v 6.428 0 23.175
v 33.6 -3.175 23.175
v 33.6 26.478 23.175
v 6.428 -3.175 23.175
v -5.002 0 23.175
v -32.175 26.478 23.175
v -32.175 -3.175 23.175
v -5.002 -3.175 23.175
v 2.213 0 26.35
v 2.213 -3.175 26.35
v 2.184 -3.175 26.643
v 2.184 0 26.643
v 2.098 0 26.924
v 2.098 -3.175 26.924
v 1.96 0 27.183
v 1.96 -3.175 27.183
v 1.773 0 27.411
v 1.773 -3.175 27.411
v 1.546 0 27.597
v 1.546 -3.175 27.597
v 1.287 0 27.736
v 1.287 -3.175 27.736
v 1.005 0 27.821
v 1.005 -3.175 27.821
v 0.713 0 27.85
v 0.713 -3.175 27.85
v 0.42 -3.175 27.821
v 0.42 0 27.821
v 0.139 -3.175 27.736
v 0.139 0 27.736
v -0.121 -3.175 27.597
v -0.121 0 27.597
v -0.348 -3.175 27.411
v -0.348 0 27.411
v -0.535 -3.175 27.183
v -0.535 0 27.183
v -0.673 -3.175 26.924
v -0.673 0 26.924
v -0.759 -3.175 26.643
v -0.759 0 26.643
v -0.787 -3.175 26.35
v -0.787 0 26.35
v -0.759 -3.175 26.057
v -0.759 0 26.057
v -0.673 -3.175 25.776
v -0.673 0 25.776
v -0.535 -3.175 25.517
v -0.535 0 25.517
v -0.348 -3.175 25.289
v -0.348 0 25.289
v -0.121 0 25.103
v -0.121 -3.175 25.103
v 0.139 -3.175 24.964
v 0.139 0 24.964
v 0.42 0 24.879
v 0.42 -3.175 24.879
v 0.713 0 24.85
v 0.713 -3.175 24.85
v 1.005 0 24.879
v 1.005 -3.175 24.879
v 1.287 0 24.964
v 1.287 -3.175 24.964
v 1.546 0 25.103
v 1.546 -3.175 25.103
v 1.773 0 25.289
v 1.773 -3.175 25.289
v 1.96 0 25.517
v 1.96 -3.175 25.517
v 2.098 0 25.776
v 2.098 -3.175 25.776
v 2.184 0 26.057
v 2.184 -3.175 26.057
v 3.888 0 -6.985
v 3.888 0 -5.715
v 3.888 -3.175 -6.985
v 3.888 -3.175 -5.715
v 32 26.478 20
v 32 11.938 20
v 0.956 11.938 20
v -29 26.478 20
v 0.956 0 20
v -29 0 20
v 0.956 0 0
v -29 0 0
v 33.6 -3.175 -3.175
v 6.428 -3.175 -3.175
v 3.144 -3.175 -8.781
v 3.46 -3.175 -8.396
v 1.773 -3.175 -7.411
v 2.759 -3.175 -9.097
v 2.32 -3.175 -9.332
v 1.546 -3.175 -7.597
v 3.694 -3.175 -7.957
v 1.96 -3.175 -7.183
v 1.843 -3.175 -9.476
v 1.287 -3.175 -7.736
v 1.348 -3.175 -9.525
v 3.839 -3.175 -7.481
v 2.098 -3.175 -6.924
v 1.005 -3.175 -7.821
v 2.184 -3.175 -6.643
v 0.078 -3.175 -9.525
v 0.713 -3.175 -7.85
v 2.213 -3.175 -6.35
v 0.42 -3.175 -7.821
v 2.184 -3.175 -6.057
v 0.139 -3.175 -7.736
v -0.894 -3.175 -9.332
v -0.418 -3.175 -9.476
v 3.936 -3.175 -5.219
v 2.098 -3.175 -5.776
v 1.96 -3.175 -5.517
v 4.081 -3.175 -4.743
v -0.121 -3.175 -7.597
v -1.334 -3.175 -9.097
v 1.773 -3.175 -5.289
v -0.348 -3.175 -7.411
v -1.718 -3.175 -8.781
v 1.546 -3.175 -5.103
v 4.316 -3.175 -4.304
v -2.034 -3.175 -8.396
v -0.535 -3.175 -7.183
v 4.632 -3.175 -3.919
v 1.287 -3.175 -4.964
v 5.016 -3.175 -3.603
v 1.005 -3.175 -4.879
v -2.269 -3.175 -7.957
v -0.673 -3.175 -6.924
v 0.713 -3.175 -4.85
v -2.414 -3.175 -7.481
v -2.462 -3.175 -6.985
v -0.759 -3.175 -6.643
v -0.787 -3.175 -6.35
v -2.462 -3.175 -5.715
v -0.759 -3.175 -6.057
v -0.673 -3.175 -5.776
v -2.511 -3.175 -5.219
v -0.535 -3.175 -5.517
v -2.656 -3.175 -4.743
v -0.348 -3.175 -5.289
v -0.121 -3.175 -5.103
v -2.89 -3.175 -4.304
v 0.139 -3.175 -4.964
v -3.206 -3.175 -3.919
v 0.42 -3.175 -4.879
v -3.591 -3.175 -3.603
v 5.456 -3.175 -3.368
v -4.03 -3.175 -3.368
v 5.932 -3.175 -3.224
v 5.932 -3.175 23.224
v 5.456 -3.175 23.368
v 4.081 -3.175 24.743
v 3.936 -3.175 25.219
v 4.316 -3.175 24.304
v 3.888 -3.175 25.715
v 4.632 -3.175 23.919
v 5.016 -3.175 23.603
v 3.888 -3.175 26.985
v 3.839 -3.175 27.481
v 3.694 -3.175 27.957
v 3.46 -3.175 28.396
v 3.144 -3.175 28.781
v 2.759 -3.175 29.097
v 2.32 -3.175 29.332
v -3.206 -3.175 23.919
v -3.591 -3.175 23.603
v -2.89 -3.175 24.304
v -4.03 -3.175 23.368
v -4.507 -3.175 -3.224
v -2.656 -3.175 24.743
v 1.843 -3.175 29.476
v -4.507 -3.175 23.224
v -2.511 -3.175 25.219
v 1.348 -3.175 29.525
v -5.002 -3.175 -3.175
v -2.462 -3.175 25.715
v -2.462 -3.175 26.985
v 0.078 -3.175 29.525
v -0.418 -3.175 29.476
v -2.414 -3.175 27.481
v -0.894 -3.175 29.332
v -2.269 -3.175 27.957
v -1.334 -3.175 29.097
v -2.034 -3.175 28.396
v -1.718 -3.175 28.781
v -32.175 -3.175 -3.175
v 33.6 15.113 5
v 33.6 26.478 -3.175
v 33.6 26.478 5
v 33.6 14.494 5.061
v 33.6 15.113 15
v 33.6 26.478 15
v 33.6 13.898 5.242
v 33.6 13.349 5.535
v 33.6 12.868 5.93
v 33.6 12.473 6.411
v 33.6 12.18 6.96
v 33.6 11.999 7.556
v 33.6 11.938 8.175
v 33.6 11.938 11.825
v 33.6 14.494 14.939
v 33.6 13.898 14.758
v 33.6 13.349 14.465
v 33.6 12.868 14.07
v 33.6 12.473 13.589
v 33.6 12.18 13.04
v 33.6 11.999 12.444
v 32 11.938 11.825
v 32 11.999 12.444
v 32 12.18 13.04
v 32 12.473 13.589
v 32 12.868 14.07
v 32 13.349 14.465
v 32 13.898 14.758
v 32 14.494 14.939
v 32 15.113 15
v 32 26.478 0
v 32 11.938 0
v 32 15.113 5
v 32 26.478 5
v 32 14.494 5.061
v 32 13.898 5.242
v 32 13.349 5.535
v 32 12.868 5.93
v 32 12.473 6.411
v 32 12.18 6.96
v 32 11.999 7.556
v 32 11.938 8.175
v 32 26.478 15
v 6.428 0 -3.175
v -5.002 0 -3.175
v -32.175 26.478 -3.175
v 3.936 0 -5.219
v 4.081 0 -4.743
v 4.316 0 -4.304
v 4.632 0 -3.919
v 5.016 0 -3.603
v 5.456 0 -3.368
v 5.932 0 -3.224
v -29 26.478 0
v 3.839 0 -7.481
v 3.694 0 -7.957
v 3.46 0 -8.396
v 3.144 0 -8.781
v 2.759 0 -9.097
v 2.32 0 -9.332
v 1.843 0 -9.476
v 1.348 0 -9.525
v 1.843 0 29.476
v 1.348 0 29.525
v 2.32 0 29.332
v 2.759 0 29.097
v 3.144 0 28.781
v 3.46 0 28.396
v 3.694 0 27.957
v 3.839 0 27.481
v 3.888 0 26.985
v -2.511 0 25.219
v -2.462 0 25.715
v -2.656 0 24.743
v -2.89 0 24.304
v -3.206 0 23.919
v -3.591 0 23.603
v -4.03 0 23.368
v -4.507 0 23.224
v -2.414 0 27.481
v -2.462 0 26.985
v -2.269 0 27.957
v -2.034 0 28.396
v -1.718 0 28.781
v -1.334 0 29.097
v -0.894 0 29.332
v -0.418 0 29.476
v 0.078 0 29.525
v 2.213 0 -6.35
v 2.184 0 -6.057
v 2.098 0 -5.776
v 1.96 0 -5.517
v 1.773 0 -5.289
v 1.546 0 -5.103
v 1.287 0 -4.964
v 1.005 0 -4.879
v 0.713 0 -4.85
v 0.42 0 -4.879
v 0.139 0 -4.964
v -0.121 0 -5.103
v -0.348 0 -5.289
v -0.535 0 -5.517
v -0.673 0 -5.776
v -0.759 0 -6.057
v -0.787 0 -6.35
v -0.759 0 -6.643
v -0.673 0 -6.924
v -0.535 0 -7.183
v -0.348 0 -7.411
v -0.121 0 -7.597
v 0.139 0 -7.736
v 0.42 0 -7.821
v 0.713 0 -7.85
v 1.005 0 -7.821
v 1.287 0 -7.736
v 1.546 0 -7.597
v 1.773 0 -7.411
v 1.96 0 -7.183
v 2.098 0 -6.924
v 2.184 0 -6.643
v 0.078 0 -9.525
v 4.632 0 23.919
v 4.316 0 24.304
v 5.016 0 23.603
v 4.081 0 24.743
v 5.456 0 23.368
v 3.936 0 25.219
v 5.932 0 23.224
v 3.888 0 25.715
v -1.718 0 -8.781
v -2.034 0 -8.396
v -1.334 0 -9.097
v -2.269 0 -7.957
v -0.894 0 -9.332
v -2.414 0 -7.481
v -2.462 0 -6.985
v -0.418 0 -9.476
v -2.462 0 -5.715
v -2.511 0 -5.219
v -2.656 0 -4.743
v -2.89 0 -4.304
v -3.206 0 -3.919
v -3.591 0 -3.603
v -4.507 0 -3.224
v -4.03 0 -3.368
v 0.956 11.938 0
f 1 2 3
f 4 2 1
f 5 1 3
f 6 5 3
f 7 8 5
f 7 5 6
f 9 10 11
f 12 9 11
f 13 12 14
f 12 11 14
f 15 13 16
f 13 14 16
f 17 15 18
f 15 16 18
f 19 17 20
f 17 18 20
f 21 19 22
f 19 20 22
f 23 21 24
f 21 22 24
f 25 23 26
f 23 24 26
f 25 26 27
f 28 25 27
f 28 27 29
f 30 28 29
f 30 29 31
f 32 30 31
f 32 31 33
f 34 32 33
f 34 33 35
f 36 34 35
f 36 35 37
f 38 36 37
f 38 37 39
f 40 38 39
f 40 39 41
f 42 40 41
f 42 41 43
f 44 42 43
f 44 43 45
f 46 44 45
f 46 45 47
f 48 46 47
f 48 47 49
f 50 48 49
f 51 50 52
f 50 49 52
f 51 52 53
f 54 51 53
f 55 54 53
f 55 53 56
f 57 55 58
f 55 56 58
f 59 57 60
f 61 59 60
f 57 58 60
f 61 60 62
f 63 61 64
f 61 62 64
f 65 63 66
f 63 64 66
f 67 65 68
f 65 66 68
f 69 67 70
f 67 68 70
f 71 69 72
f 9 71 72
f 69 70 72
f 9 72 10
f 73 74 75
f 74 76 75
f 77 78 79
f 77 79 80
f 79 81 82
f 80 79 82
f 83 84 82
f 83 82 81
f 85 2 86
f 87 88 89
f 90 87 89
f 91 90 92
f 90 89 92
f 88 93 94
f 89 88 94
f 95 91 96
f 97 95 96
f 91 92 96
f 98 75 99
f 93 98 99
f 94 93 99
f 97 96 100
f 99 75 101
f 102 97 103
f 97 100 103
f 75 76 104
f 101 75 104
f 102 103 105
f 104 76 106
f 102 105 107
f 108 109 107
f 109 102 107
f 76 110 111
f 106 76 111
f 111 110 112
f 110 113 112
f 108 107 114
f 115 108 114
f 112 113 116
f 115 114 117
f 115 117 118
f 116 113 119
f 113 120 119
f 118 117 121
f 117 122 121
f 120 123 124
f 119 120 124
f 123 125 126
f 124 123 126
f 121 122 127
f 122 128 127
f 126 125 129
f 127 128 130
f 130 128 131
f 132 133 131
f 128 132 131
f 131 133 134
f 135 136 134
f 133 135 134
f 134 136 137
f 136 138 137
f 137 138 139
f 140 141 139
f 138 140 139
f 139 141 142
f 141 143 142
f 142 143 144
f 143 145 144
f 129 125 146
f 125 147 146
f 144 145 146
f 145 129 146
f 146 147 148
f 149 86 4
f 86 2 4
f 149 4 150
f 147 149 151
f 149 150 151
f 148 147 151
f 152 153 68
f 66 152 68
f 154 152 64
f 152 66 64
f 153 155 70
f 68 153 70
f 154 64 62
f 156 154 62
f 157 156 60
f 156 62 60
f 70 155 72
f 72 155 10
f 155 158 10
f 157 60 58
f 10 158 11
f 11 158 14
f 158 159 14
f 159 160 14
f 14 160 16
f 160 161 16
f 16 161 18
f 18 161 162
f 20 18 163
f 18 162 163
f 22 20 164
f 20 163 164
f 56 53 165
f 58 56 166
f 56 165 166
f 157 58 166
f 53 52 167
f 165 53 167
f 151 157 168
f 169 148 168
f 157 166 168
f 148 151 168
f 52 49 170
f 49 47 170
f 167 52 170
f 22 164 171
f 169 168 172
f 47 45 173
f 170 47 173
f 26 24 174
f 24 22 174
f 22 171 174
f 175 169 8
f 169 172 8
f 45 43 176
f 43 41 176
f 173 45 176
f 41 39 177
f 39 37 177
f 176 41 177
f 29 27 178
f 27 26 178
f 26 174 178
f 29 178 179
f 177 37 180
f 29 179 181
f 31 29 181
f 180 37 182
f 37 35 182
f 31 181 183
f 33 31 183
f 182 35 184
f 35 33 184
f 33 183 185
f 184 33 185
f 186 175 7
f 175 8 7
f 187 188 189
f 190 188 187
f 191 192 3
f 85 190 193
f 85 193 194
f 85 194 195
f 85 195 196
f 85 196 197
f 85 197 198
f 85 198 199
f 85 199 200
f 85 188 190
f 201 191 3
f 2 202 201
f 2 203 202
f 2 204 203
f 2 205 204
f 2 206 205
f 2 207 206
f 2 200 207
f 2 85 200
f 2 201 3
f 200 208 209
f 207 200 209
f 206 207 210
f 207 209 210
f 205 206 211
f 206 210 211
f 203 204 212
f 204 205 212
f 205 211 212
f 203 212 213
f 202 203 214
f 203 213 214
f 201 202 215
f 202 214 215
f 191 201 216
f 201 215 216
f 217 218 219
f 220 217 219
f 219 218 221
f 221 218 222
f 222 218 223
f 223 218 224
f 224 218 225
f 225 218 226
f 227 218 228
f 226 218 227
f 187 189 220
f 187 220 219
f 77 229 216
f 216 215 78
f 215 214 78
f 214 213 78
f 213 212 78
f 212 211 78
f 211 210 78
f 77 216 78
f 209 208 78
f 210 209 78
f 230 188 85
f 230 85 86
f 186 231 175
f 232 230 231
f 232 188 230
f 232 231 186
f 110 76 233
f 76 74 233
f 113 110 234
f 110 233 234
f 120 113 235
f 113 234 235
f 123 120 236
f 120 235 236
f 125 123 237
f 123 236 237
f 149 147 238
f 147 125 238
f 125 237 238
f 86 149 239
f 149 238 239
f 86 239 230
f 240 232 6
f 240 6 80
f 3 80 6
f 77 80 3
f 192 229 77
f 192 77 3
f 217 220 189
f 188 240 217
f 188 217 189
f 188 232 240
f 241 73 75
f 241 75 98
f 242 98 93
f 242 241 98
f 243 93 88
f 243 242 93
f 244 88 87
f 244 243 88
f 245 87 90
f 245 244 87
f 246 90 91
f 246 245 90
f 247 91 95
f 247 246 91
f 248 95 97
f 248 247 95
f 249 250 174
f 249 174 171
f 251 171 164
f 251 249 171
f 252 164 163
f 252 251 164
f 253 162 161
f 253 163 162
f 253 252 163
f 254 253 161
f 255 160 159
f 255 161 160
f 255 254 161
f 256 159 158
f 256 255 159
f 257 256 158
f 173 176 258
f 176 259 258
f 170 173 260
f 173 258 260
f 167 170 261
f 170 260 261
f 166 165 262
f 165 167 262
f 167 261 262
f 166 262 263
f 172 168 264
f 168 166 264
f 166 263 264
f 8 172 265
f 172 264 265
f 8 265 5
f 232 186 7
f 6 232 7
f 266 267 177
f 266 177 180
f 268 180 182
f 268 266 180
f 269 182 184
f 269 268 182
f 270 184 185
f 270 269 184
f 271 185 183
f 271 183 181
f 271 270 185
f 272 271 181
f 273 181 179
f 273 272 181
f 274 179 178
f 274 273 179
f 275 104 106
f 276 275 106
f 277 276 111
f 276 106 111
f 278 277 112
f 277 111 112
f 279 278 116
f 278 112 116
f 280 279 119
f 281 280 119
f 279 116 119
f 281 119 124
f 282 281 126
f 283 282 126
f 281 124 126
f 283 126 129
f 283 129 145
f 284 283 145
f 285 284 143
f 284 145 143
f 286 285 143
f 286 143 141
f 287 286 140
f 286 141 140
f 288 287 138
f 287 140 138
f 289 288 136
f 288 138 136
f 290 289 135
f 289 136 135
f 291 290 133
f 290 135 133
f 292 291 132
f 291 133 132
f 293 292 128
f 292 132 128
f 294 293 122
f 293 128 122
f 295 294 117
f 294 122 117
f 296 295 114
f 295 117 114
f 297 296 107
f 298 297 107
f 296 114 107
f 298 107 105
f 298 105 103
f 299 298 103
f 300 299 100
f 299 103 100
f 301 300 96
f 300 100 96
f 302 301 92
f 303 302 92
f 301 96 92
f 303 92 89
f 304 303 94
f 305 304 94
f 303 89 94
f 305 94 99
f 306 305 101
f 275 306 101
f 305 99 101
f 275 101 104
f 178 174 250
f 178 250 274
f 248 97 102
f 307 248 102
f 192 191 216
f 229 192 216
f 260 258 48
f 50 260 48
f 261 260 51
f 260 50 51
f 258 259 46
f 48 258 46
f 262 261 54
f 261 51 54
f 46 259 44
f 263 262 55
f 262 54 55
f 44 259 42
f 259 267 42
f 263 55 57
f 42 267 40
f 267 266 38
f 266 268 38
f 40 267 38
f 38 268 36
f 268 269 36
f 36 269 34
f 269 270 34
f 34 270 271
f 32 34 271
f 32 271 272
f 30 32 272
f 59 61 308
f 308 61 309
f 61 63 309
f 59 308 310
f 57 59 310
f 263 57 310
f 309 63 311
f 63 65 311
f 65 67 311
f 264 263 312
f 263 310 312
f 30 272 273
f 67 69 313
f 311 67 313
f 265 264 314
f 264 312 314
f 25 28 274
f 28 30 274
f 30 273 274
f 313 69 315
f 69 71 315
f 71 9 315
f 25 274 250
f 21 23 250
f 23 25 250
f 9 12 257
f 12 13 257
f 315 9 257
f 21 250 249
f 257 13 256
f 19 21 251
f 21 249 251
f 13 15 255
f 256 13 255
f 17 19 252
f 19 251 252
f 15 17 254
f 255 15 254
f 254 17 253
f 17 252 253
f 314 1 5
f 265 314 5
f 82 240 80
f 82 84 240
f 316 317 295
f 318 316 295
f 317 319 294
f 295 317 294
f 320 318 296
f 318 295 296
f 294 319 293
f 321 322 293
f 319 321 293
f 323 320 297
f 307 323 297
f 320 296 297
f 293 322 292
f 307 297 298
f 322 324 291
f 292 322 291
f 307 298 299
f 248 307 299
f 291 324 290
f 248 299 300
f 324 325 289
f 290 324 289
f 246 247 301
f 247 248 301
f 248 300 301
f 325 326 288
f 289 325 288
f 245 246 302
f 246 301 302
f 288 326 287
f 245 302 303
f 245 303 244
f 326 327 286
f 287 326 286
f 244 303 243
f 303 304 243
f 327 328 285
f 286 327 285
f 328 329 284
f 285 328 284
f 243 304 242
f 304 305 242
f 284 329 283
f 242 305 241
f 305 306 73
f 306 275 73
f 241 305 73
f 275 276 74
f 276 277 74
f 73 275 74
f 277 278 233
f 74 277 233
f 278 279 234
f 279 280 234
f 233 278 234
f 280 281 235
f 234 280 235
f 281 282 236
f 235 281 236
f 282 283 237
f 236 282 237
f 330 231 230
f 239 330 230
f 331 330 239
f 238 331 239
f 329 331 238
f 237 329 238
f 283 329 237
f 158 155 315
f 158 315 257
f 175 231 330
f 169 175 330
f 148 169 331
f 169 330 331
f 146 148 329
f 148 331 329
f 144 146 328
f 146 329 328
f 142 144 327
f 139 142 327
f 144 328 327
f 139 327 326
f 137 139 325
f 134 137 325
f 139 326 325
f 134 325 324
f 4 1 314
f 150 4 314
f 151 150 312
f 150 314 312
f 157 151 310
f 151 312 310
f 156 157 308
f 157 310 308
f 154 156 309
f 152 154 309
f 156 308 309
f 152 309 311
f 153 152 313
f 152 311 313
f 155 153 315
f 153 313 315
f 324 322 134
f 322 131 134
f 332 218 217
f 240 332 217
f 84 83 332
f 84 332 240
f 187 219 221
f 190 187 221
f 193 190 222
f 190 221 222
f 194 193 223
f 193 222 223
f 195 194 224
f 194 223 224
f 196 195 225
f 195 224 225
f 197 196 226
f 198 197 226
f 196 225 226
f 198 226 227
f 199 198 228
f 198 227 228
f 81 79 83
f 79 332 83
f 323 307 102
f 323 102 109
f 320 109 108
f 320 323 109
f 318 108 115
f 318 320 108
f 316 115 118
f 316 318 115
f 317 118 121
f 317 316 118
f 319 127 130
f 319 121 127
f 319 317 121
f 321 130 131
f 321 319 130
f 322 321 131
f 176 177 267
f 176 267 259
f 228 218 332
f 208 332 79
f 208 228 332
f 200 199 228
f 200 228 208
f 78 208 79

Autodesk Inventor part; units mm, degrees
ref_plane "YZ Plane" through (0, 0, 0) normal (1, 0, 0) x (0, 1, 0)
ref_plane "XZ Plane" through (0, 0, 0) normal (0, 1, 0) x (-1, 0, 0)
sketch "Sketch1" plane through (0, 0, 0) normal (0, 0, 1) x (1, 0, 0)
  line L0 (0, 0) -> (32, 0)
  line L1 (32, 0) -> (32, 11.938)
  line L2 (32, 11.938) -> (0, 11.938)
  line L3 (0, 11.938) -> (0, 0)
  line L4 (0, 0) -> (-29, 0)
  line L5 (-29, 0) -> (-29, 11.938)
  line L6 (-29, 11.938) -> (0, 11.938)
  line L7 (0, 11.938) -> (0, 0)
  line L8 (32, 11.938) -> (-9, 11.938)
  line L9 (-9, 11.938) -> (-9, 23.938)
  line L10 (-9, 23.938) -> (32, 23.938)
  line L11 (32, 23.938) -> (32, 11.938)
  line L12 (32, 0) -> (33.6002, 0)
  line L13 (33.6002, 0) -> (33.6002, 23.938)
  line L14 (33.6002, 23.938) -> (32, 23.938)
  line L15 (32, 23.938) -> (32, 0)
  line L16 (33.6002, 0) -> (-29, 0)
  line L17 (-29, 0) -> (-29, -3.175)
  line L18 (-29, -3.175) -> (33.6002, -3.175)
  line L19 (33.6002, -3.175) -> (33.6002, 0)
  line L20 (-29, -3.175) -> (-32.175, -3.175)
  line L21 (-32.175, -3.175) -> (-32.175, 23.938)
  line L22 (-32.175, 23.938) -> (-29, 23.938)
  line L23 (-29, 23.938) -> (-29, -3.175)
  line L24 (-32.175, 23.938) -> (33.6002, 23.938)
  line L25 (33.6002, 23.938) -> (33.6002, 27.113)
  line L26 (33.6002, 27.113) -> (-32.175, 27.113)
  line L27 (-32.175, 27.113) -> (-32.175, 23.938)
  line L28 (0, 11.938) -> (0.9559, 11.938)
  line L29 (0.9559, 11.938) -> (0.9559, 0)
  line L30 (0.9559, 0) -> (0, 0)
  line L31 (0, 0) -> (0, 11.938)
  point P0 (0.9559, 0)
  dimension "d0" = 32
  dimension "d1" = 11.938
  dimension "d2" = 29
  dimension "d3" = 41
  dimension "d4" = 12
  dimension "d5" = 1.6002
  dimension "d7" = 3.175
  dimension "d8" = 3.175
  dimension "d9" = 3.175
extrude "Extrusion1" add sketch "Sketch1" along normal blind 20 contours L0 L12 L19 L18 L17 L4 | L29 L2 L1 L0 | L17 L20 L21 L22 L23 L5 | L1 L11 L14 L13 L12
sketch "Sketch2" plane through (0, 0, 20) normal (0, 0, 1) x (1, 0, 0)
  line L0 (-29, 23.938) -> (-32.175, 23.938) projected
  line L1 (-32.175, -3.175) -> (33.6002, -3.175) projected
  line L2 (-32.175, 23.938) -> (33.6002, 23.938)
  line L3 (33.6002, 23.938) -> (33.6002, -3.175)
  line L4 (33.6002, -3.175) -> (-32.175, -3.175)
  line L5 (-32.175, -3.175) -> (-32.175, 23.938)
  point P0 (0, 0)
  point P1 (-32.175, -3.175)
ref_plane "Work Plane1" through (0, 0, 10) normal (0, 0, 1) x (1, 0, 0)
extrude "Extrusion2" add sketch "Sketch2" along normal blind 3.175
mirror "Mirror1" about plane through (0, 0, 10) normal (0, 0, 1) of "Extrusion2"
sketch "Sketch3" plane through (33.6002, -3.175, 23.175) normal (1, 0, 0) x (0, 0, -1)
  line L0 (23.175, 15.113) -> (3.175, 15.113) projected
  line L1 (23.175, 27.113) -> (3.175, 27.113) projected
  line L2 (13.175, 15.113) -> (8.175, 15.113)
  line L3 (8.175, 15.113) -> (8.175, 27.113)
  line L4 (8.175, 27.113) -> (13.175, 27.113)
  line L5 (13.175, 27.113) -> (13.175, 15.113)
  line L6 (13.175, 27.113) -> (18.175, 27.113)
  line L7 (18.175, 27.113) -> (18.175, 15.113)
  line L8 (18.175, 15.113) -> (13.175, 15.113)
  line L9 (13.175, 15.113) -> (13.175, 27.113)
  point P0 (23.175, 3.175)
  dimension "d15" = 5
  dimension "d16" = 5
extrude "Extrusion3" cut sketch "Sketch3" against normal blind 3.175
fillet "Fillet1" radius 3.175 2 edges at (32.8001, 11.938, 5) (32.8001, 11.938, 15)
sketch "Sketch4" plane through (-32.175, -3.175, 23.175) normal (0, -1, 0) x (1, 0, 0)
  line L0 (65.7752, -8.175) -> (65.7752, 0) projected
  line L1 (65.7752, -26.35) -> (0, -26.35) projected
  line L2 (65.7752, 0) -> (0, 0)
  line L3 (0, 0) -> (0, -26.35)
  line L4 (0, -26.35) -> (65.7752, -26.35)
  line L5 (65.7752, -26.35) -> (65.7752, 0)
  line L6 (32.8876, 0) -> (36.0626, 0)
  line L7 (36.0626, 0) -> (36.0626, 6.35)
  line L8 (36.0626, 6.35) -> (32.8876, 6.35)
  line L9 (32.8876, 6.35) -> (32.8876, 0)
  line L10 (32.8876, 6.35) -> (29.7126, 6.35)
  line L11 (29.7126, 6.35) -> (29.7126, 0)
  line L12 (29.7126, 0) -> (32.8876, 0)
  line L13 (32.8876, 0) -> (32.8876, 6.35)
  circle A0 centre (32.8876, 3.175) radius 1.5
  line L14 (65.7752, -13.175) -> (55.6443, -13.175)
  line L15 (36.0626, -26.35) -> (36.0626, -32.7)
  line L16 (36.0626, -32.7) -> (32.8876, -32.7)
  line L17 (32.8876, -32.7) -> (29.7126, -32.7)
  line L18 (29.7126, -32.7) -> (29.7126, -26.35)
  circle A1 centre (32.8876, -29.525) radius 1.5
  point P0 (32.175, -23.175)
  dimension "d20" = 3.175
  dimension "d21" = 6.35
  dimension "d22" = 3.175
  dimension "d23" = 3
extrude "Extrusion4" add sketch "Sketch4" against normal blind 3.175 contours L2 L9 A0 L8 L7 | L2 L11 L10 L9 A0 | L15 L16 L17 L18 L1
fillet "Fillet2" radius 2.54 8 edges at (-2.4624, -1.5875, 23.175) (-2.4624, -1.5875, 29.525) (3.8876, -1.5875, 29.525) (3.8876, -1.5875, 23.175) (-2.4624, -1.5875, -9.525) (3.8876, -1.5875, -9.525) (3.8876, -1.5875, -3.175) (-2.4624, -1.5875, -3.175)
sketch "Sketch5" plane through (-29, 23.938, 20) normal (0, 1, 0) x (1, 0, 0)
  line L0 (62.6002, 5) -> (61, 5) projected
  line L1 (61, 5) -> (61, 0) projected
  line L2 (61, 0) -> (0, 0) projected
  line L3 (0, 20) -> (0, 0) projected
  line L4 (61, 20) -> (0, 20) projected
  line L5 (61, 20) -> (61, 15) projected
  line L6 (61, 15) -> (62.6002, 15) projected
  line L7 (62.6002, 23.175) -> (62.6002, 15) projected
  line L8 (62.6002, 23.175) -> (-3.175, 23.175) projected
  line L9 (-3.175, 23.175) -> (-3.175, -3.175) projected
  line L10 (62.6002, -3.175) -> (-3.175, -3.175) projected
  line L11 (62.6002, 5) -> (62.6002, -3.175) projected
  point P0 (29, 20)
extrude "Extrusion5" add sketch "Sketch5" along normal blind 2.54
properties part number "RadioMount" material "Rubber, Silicone"
